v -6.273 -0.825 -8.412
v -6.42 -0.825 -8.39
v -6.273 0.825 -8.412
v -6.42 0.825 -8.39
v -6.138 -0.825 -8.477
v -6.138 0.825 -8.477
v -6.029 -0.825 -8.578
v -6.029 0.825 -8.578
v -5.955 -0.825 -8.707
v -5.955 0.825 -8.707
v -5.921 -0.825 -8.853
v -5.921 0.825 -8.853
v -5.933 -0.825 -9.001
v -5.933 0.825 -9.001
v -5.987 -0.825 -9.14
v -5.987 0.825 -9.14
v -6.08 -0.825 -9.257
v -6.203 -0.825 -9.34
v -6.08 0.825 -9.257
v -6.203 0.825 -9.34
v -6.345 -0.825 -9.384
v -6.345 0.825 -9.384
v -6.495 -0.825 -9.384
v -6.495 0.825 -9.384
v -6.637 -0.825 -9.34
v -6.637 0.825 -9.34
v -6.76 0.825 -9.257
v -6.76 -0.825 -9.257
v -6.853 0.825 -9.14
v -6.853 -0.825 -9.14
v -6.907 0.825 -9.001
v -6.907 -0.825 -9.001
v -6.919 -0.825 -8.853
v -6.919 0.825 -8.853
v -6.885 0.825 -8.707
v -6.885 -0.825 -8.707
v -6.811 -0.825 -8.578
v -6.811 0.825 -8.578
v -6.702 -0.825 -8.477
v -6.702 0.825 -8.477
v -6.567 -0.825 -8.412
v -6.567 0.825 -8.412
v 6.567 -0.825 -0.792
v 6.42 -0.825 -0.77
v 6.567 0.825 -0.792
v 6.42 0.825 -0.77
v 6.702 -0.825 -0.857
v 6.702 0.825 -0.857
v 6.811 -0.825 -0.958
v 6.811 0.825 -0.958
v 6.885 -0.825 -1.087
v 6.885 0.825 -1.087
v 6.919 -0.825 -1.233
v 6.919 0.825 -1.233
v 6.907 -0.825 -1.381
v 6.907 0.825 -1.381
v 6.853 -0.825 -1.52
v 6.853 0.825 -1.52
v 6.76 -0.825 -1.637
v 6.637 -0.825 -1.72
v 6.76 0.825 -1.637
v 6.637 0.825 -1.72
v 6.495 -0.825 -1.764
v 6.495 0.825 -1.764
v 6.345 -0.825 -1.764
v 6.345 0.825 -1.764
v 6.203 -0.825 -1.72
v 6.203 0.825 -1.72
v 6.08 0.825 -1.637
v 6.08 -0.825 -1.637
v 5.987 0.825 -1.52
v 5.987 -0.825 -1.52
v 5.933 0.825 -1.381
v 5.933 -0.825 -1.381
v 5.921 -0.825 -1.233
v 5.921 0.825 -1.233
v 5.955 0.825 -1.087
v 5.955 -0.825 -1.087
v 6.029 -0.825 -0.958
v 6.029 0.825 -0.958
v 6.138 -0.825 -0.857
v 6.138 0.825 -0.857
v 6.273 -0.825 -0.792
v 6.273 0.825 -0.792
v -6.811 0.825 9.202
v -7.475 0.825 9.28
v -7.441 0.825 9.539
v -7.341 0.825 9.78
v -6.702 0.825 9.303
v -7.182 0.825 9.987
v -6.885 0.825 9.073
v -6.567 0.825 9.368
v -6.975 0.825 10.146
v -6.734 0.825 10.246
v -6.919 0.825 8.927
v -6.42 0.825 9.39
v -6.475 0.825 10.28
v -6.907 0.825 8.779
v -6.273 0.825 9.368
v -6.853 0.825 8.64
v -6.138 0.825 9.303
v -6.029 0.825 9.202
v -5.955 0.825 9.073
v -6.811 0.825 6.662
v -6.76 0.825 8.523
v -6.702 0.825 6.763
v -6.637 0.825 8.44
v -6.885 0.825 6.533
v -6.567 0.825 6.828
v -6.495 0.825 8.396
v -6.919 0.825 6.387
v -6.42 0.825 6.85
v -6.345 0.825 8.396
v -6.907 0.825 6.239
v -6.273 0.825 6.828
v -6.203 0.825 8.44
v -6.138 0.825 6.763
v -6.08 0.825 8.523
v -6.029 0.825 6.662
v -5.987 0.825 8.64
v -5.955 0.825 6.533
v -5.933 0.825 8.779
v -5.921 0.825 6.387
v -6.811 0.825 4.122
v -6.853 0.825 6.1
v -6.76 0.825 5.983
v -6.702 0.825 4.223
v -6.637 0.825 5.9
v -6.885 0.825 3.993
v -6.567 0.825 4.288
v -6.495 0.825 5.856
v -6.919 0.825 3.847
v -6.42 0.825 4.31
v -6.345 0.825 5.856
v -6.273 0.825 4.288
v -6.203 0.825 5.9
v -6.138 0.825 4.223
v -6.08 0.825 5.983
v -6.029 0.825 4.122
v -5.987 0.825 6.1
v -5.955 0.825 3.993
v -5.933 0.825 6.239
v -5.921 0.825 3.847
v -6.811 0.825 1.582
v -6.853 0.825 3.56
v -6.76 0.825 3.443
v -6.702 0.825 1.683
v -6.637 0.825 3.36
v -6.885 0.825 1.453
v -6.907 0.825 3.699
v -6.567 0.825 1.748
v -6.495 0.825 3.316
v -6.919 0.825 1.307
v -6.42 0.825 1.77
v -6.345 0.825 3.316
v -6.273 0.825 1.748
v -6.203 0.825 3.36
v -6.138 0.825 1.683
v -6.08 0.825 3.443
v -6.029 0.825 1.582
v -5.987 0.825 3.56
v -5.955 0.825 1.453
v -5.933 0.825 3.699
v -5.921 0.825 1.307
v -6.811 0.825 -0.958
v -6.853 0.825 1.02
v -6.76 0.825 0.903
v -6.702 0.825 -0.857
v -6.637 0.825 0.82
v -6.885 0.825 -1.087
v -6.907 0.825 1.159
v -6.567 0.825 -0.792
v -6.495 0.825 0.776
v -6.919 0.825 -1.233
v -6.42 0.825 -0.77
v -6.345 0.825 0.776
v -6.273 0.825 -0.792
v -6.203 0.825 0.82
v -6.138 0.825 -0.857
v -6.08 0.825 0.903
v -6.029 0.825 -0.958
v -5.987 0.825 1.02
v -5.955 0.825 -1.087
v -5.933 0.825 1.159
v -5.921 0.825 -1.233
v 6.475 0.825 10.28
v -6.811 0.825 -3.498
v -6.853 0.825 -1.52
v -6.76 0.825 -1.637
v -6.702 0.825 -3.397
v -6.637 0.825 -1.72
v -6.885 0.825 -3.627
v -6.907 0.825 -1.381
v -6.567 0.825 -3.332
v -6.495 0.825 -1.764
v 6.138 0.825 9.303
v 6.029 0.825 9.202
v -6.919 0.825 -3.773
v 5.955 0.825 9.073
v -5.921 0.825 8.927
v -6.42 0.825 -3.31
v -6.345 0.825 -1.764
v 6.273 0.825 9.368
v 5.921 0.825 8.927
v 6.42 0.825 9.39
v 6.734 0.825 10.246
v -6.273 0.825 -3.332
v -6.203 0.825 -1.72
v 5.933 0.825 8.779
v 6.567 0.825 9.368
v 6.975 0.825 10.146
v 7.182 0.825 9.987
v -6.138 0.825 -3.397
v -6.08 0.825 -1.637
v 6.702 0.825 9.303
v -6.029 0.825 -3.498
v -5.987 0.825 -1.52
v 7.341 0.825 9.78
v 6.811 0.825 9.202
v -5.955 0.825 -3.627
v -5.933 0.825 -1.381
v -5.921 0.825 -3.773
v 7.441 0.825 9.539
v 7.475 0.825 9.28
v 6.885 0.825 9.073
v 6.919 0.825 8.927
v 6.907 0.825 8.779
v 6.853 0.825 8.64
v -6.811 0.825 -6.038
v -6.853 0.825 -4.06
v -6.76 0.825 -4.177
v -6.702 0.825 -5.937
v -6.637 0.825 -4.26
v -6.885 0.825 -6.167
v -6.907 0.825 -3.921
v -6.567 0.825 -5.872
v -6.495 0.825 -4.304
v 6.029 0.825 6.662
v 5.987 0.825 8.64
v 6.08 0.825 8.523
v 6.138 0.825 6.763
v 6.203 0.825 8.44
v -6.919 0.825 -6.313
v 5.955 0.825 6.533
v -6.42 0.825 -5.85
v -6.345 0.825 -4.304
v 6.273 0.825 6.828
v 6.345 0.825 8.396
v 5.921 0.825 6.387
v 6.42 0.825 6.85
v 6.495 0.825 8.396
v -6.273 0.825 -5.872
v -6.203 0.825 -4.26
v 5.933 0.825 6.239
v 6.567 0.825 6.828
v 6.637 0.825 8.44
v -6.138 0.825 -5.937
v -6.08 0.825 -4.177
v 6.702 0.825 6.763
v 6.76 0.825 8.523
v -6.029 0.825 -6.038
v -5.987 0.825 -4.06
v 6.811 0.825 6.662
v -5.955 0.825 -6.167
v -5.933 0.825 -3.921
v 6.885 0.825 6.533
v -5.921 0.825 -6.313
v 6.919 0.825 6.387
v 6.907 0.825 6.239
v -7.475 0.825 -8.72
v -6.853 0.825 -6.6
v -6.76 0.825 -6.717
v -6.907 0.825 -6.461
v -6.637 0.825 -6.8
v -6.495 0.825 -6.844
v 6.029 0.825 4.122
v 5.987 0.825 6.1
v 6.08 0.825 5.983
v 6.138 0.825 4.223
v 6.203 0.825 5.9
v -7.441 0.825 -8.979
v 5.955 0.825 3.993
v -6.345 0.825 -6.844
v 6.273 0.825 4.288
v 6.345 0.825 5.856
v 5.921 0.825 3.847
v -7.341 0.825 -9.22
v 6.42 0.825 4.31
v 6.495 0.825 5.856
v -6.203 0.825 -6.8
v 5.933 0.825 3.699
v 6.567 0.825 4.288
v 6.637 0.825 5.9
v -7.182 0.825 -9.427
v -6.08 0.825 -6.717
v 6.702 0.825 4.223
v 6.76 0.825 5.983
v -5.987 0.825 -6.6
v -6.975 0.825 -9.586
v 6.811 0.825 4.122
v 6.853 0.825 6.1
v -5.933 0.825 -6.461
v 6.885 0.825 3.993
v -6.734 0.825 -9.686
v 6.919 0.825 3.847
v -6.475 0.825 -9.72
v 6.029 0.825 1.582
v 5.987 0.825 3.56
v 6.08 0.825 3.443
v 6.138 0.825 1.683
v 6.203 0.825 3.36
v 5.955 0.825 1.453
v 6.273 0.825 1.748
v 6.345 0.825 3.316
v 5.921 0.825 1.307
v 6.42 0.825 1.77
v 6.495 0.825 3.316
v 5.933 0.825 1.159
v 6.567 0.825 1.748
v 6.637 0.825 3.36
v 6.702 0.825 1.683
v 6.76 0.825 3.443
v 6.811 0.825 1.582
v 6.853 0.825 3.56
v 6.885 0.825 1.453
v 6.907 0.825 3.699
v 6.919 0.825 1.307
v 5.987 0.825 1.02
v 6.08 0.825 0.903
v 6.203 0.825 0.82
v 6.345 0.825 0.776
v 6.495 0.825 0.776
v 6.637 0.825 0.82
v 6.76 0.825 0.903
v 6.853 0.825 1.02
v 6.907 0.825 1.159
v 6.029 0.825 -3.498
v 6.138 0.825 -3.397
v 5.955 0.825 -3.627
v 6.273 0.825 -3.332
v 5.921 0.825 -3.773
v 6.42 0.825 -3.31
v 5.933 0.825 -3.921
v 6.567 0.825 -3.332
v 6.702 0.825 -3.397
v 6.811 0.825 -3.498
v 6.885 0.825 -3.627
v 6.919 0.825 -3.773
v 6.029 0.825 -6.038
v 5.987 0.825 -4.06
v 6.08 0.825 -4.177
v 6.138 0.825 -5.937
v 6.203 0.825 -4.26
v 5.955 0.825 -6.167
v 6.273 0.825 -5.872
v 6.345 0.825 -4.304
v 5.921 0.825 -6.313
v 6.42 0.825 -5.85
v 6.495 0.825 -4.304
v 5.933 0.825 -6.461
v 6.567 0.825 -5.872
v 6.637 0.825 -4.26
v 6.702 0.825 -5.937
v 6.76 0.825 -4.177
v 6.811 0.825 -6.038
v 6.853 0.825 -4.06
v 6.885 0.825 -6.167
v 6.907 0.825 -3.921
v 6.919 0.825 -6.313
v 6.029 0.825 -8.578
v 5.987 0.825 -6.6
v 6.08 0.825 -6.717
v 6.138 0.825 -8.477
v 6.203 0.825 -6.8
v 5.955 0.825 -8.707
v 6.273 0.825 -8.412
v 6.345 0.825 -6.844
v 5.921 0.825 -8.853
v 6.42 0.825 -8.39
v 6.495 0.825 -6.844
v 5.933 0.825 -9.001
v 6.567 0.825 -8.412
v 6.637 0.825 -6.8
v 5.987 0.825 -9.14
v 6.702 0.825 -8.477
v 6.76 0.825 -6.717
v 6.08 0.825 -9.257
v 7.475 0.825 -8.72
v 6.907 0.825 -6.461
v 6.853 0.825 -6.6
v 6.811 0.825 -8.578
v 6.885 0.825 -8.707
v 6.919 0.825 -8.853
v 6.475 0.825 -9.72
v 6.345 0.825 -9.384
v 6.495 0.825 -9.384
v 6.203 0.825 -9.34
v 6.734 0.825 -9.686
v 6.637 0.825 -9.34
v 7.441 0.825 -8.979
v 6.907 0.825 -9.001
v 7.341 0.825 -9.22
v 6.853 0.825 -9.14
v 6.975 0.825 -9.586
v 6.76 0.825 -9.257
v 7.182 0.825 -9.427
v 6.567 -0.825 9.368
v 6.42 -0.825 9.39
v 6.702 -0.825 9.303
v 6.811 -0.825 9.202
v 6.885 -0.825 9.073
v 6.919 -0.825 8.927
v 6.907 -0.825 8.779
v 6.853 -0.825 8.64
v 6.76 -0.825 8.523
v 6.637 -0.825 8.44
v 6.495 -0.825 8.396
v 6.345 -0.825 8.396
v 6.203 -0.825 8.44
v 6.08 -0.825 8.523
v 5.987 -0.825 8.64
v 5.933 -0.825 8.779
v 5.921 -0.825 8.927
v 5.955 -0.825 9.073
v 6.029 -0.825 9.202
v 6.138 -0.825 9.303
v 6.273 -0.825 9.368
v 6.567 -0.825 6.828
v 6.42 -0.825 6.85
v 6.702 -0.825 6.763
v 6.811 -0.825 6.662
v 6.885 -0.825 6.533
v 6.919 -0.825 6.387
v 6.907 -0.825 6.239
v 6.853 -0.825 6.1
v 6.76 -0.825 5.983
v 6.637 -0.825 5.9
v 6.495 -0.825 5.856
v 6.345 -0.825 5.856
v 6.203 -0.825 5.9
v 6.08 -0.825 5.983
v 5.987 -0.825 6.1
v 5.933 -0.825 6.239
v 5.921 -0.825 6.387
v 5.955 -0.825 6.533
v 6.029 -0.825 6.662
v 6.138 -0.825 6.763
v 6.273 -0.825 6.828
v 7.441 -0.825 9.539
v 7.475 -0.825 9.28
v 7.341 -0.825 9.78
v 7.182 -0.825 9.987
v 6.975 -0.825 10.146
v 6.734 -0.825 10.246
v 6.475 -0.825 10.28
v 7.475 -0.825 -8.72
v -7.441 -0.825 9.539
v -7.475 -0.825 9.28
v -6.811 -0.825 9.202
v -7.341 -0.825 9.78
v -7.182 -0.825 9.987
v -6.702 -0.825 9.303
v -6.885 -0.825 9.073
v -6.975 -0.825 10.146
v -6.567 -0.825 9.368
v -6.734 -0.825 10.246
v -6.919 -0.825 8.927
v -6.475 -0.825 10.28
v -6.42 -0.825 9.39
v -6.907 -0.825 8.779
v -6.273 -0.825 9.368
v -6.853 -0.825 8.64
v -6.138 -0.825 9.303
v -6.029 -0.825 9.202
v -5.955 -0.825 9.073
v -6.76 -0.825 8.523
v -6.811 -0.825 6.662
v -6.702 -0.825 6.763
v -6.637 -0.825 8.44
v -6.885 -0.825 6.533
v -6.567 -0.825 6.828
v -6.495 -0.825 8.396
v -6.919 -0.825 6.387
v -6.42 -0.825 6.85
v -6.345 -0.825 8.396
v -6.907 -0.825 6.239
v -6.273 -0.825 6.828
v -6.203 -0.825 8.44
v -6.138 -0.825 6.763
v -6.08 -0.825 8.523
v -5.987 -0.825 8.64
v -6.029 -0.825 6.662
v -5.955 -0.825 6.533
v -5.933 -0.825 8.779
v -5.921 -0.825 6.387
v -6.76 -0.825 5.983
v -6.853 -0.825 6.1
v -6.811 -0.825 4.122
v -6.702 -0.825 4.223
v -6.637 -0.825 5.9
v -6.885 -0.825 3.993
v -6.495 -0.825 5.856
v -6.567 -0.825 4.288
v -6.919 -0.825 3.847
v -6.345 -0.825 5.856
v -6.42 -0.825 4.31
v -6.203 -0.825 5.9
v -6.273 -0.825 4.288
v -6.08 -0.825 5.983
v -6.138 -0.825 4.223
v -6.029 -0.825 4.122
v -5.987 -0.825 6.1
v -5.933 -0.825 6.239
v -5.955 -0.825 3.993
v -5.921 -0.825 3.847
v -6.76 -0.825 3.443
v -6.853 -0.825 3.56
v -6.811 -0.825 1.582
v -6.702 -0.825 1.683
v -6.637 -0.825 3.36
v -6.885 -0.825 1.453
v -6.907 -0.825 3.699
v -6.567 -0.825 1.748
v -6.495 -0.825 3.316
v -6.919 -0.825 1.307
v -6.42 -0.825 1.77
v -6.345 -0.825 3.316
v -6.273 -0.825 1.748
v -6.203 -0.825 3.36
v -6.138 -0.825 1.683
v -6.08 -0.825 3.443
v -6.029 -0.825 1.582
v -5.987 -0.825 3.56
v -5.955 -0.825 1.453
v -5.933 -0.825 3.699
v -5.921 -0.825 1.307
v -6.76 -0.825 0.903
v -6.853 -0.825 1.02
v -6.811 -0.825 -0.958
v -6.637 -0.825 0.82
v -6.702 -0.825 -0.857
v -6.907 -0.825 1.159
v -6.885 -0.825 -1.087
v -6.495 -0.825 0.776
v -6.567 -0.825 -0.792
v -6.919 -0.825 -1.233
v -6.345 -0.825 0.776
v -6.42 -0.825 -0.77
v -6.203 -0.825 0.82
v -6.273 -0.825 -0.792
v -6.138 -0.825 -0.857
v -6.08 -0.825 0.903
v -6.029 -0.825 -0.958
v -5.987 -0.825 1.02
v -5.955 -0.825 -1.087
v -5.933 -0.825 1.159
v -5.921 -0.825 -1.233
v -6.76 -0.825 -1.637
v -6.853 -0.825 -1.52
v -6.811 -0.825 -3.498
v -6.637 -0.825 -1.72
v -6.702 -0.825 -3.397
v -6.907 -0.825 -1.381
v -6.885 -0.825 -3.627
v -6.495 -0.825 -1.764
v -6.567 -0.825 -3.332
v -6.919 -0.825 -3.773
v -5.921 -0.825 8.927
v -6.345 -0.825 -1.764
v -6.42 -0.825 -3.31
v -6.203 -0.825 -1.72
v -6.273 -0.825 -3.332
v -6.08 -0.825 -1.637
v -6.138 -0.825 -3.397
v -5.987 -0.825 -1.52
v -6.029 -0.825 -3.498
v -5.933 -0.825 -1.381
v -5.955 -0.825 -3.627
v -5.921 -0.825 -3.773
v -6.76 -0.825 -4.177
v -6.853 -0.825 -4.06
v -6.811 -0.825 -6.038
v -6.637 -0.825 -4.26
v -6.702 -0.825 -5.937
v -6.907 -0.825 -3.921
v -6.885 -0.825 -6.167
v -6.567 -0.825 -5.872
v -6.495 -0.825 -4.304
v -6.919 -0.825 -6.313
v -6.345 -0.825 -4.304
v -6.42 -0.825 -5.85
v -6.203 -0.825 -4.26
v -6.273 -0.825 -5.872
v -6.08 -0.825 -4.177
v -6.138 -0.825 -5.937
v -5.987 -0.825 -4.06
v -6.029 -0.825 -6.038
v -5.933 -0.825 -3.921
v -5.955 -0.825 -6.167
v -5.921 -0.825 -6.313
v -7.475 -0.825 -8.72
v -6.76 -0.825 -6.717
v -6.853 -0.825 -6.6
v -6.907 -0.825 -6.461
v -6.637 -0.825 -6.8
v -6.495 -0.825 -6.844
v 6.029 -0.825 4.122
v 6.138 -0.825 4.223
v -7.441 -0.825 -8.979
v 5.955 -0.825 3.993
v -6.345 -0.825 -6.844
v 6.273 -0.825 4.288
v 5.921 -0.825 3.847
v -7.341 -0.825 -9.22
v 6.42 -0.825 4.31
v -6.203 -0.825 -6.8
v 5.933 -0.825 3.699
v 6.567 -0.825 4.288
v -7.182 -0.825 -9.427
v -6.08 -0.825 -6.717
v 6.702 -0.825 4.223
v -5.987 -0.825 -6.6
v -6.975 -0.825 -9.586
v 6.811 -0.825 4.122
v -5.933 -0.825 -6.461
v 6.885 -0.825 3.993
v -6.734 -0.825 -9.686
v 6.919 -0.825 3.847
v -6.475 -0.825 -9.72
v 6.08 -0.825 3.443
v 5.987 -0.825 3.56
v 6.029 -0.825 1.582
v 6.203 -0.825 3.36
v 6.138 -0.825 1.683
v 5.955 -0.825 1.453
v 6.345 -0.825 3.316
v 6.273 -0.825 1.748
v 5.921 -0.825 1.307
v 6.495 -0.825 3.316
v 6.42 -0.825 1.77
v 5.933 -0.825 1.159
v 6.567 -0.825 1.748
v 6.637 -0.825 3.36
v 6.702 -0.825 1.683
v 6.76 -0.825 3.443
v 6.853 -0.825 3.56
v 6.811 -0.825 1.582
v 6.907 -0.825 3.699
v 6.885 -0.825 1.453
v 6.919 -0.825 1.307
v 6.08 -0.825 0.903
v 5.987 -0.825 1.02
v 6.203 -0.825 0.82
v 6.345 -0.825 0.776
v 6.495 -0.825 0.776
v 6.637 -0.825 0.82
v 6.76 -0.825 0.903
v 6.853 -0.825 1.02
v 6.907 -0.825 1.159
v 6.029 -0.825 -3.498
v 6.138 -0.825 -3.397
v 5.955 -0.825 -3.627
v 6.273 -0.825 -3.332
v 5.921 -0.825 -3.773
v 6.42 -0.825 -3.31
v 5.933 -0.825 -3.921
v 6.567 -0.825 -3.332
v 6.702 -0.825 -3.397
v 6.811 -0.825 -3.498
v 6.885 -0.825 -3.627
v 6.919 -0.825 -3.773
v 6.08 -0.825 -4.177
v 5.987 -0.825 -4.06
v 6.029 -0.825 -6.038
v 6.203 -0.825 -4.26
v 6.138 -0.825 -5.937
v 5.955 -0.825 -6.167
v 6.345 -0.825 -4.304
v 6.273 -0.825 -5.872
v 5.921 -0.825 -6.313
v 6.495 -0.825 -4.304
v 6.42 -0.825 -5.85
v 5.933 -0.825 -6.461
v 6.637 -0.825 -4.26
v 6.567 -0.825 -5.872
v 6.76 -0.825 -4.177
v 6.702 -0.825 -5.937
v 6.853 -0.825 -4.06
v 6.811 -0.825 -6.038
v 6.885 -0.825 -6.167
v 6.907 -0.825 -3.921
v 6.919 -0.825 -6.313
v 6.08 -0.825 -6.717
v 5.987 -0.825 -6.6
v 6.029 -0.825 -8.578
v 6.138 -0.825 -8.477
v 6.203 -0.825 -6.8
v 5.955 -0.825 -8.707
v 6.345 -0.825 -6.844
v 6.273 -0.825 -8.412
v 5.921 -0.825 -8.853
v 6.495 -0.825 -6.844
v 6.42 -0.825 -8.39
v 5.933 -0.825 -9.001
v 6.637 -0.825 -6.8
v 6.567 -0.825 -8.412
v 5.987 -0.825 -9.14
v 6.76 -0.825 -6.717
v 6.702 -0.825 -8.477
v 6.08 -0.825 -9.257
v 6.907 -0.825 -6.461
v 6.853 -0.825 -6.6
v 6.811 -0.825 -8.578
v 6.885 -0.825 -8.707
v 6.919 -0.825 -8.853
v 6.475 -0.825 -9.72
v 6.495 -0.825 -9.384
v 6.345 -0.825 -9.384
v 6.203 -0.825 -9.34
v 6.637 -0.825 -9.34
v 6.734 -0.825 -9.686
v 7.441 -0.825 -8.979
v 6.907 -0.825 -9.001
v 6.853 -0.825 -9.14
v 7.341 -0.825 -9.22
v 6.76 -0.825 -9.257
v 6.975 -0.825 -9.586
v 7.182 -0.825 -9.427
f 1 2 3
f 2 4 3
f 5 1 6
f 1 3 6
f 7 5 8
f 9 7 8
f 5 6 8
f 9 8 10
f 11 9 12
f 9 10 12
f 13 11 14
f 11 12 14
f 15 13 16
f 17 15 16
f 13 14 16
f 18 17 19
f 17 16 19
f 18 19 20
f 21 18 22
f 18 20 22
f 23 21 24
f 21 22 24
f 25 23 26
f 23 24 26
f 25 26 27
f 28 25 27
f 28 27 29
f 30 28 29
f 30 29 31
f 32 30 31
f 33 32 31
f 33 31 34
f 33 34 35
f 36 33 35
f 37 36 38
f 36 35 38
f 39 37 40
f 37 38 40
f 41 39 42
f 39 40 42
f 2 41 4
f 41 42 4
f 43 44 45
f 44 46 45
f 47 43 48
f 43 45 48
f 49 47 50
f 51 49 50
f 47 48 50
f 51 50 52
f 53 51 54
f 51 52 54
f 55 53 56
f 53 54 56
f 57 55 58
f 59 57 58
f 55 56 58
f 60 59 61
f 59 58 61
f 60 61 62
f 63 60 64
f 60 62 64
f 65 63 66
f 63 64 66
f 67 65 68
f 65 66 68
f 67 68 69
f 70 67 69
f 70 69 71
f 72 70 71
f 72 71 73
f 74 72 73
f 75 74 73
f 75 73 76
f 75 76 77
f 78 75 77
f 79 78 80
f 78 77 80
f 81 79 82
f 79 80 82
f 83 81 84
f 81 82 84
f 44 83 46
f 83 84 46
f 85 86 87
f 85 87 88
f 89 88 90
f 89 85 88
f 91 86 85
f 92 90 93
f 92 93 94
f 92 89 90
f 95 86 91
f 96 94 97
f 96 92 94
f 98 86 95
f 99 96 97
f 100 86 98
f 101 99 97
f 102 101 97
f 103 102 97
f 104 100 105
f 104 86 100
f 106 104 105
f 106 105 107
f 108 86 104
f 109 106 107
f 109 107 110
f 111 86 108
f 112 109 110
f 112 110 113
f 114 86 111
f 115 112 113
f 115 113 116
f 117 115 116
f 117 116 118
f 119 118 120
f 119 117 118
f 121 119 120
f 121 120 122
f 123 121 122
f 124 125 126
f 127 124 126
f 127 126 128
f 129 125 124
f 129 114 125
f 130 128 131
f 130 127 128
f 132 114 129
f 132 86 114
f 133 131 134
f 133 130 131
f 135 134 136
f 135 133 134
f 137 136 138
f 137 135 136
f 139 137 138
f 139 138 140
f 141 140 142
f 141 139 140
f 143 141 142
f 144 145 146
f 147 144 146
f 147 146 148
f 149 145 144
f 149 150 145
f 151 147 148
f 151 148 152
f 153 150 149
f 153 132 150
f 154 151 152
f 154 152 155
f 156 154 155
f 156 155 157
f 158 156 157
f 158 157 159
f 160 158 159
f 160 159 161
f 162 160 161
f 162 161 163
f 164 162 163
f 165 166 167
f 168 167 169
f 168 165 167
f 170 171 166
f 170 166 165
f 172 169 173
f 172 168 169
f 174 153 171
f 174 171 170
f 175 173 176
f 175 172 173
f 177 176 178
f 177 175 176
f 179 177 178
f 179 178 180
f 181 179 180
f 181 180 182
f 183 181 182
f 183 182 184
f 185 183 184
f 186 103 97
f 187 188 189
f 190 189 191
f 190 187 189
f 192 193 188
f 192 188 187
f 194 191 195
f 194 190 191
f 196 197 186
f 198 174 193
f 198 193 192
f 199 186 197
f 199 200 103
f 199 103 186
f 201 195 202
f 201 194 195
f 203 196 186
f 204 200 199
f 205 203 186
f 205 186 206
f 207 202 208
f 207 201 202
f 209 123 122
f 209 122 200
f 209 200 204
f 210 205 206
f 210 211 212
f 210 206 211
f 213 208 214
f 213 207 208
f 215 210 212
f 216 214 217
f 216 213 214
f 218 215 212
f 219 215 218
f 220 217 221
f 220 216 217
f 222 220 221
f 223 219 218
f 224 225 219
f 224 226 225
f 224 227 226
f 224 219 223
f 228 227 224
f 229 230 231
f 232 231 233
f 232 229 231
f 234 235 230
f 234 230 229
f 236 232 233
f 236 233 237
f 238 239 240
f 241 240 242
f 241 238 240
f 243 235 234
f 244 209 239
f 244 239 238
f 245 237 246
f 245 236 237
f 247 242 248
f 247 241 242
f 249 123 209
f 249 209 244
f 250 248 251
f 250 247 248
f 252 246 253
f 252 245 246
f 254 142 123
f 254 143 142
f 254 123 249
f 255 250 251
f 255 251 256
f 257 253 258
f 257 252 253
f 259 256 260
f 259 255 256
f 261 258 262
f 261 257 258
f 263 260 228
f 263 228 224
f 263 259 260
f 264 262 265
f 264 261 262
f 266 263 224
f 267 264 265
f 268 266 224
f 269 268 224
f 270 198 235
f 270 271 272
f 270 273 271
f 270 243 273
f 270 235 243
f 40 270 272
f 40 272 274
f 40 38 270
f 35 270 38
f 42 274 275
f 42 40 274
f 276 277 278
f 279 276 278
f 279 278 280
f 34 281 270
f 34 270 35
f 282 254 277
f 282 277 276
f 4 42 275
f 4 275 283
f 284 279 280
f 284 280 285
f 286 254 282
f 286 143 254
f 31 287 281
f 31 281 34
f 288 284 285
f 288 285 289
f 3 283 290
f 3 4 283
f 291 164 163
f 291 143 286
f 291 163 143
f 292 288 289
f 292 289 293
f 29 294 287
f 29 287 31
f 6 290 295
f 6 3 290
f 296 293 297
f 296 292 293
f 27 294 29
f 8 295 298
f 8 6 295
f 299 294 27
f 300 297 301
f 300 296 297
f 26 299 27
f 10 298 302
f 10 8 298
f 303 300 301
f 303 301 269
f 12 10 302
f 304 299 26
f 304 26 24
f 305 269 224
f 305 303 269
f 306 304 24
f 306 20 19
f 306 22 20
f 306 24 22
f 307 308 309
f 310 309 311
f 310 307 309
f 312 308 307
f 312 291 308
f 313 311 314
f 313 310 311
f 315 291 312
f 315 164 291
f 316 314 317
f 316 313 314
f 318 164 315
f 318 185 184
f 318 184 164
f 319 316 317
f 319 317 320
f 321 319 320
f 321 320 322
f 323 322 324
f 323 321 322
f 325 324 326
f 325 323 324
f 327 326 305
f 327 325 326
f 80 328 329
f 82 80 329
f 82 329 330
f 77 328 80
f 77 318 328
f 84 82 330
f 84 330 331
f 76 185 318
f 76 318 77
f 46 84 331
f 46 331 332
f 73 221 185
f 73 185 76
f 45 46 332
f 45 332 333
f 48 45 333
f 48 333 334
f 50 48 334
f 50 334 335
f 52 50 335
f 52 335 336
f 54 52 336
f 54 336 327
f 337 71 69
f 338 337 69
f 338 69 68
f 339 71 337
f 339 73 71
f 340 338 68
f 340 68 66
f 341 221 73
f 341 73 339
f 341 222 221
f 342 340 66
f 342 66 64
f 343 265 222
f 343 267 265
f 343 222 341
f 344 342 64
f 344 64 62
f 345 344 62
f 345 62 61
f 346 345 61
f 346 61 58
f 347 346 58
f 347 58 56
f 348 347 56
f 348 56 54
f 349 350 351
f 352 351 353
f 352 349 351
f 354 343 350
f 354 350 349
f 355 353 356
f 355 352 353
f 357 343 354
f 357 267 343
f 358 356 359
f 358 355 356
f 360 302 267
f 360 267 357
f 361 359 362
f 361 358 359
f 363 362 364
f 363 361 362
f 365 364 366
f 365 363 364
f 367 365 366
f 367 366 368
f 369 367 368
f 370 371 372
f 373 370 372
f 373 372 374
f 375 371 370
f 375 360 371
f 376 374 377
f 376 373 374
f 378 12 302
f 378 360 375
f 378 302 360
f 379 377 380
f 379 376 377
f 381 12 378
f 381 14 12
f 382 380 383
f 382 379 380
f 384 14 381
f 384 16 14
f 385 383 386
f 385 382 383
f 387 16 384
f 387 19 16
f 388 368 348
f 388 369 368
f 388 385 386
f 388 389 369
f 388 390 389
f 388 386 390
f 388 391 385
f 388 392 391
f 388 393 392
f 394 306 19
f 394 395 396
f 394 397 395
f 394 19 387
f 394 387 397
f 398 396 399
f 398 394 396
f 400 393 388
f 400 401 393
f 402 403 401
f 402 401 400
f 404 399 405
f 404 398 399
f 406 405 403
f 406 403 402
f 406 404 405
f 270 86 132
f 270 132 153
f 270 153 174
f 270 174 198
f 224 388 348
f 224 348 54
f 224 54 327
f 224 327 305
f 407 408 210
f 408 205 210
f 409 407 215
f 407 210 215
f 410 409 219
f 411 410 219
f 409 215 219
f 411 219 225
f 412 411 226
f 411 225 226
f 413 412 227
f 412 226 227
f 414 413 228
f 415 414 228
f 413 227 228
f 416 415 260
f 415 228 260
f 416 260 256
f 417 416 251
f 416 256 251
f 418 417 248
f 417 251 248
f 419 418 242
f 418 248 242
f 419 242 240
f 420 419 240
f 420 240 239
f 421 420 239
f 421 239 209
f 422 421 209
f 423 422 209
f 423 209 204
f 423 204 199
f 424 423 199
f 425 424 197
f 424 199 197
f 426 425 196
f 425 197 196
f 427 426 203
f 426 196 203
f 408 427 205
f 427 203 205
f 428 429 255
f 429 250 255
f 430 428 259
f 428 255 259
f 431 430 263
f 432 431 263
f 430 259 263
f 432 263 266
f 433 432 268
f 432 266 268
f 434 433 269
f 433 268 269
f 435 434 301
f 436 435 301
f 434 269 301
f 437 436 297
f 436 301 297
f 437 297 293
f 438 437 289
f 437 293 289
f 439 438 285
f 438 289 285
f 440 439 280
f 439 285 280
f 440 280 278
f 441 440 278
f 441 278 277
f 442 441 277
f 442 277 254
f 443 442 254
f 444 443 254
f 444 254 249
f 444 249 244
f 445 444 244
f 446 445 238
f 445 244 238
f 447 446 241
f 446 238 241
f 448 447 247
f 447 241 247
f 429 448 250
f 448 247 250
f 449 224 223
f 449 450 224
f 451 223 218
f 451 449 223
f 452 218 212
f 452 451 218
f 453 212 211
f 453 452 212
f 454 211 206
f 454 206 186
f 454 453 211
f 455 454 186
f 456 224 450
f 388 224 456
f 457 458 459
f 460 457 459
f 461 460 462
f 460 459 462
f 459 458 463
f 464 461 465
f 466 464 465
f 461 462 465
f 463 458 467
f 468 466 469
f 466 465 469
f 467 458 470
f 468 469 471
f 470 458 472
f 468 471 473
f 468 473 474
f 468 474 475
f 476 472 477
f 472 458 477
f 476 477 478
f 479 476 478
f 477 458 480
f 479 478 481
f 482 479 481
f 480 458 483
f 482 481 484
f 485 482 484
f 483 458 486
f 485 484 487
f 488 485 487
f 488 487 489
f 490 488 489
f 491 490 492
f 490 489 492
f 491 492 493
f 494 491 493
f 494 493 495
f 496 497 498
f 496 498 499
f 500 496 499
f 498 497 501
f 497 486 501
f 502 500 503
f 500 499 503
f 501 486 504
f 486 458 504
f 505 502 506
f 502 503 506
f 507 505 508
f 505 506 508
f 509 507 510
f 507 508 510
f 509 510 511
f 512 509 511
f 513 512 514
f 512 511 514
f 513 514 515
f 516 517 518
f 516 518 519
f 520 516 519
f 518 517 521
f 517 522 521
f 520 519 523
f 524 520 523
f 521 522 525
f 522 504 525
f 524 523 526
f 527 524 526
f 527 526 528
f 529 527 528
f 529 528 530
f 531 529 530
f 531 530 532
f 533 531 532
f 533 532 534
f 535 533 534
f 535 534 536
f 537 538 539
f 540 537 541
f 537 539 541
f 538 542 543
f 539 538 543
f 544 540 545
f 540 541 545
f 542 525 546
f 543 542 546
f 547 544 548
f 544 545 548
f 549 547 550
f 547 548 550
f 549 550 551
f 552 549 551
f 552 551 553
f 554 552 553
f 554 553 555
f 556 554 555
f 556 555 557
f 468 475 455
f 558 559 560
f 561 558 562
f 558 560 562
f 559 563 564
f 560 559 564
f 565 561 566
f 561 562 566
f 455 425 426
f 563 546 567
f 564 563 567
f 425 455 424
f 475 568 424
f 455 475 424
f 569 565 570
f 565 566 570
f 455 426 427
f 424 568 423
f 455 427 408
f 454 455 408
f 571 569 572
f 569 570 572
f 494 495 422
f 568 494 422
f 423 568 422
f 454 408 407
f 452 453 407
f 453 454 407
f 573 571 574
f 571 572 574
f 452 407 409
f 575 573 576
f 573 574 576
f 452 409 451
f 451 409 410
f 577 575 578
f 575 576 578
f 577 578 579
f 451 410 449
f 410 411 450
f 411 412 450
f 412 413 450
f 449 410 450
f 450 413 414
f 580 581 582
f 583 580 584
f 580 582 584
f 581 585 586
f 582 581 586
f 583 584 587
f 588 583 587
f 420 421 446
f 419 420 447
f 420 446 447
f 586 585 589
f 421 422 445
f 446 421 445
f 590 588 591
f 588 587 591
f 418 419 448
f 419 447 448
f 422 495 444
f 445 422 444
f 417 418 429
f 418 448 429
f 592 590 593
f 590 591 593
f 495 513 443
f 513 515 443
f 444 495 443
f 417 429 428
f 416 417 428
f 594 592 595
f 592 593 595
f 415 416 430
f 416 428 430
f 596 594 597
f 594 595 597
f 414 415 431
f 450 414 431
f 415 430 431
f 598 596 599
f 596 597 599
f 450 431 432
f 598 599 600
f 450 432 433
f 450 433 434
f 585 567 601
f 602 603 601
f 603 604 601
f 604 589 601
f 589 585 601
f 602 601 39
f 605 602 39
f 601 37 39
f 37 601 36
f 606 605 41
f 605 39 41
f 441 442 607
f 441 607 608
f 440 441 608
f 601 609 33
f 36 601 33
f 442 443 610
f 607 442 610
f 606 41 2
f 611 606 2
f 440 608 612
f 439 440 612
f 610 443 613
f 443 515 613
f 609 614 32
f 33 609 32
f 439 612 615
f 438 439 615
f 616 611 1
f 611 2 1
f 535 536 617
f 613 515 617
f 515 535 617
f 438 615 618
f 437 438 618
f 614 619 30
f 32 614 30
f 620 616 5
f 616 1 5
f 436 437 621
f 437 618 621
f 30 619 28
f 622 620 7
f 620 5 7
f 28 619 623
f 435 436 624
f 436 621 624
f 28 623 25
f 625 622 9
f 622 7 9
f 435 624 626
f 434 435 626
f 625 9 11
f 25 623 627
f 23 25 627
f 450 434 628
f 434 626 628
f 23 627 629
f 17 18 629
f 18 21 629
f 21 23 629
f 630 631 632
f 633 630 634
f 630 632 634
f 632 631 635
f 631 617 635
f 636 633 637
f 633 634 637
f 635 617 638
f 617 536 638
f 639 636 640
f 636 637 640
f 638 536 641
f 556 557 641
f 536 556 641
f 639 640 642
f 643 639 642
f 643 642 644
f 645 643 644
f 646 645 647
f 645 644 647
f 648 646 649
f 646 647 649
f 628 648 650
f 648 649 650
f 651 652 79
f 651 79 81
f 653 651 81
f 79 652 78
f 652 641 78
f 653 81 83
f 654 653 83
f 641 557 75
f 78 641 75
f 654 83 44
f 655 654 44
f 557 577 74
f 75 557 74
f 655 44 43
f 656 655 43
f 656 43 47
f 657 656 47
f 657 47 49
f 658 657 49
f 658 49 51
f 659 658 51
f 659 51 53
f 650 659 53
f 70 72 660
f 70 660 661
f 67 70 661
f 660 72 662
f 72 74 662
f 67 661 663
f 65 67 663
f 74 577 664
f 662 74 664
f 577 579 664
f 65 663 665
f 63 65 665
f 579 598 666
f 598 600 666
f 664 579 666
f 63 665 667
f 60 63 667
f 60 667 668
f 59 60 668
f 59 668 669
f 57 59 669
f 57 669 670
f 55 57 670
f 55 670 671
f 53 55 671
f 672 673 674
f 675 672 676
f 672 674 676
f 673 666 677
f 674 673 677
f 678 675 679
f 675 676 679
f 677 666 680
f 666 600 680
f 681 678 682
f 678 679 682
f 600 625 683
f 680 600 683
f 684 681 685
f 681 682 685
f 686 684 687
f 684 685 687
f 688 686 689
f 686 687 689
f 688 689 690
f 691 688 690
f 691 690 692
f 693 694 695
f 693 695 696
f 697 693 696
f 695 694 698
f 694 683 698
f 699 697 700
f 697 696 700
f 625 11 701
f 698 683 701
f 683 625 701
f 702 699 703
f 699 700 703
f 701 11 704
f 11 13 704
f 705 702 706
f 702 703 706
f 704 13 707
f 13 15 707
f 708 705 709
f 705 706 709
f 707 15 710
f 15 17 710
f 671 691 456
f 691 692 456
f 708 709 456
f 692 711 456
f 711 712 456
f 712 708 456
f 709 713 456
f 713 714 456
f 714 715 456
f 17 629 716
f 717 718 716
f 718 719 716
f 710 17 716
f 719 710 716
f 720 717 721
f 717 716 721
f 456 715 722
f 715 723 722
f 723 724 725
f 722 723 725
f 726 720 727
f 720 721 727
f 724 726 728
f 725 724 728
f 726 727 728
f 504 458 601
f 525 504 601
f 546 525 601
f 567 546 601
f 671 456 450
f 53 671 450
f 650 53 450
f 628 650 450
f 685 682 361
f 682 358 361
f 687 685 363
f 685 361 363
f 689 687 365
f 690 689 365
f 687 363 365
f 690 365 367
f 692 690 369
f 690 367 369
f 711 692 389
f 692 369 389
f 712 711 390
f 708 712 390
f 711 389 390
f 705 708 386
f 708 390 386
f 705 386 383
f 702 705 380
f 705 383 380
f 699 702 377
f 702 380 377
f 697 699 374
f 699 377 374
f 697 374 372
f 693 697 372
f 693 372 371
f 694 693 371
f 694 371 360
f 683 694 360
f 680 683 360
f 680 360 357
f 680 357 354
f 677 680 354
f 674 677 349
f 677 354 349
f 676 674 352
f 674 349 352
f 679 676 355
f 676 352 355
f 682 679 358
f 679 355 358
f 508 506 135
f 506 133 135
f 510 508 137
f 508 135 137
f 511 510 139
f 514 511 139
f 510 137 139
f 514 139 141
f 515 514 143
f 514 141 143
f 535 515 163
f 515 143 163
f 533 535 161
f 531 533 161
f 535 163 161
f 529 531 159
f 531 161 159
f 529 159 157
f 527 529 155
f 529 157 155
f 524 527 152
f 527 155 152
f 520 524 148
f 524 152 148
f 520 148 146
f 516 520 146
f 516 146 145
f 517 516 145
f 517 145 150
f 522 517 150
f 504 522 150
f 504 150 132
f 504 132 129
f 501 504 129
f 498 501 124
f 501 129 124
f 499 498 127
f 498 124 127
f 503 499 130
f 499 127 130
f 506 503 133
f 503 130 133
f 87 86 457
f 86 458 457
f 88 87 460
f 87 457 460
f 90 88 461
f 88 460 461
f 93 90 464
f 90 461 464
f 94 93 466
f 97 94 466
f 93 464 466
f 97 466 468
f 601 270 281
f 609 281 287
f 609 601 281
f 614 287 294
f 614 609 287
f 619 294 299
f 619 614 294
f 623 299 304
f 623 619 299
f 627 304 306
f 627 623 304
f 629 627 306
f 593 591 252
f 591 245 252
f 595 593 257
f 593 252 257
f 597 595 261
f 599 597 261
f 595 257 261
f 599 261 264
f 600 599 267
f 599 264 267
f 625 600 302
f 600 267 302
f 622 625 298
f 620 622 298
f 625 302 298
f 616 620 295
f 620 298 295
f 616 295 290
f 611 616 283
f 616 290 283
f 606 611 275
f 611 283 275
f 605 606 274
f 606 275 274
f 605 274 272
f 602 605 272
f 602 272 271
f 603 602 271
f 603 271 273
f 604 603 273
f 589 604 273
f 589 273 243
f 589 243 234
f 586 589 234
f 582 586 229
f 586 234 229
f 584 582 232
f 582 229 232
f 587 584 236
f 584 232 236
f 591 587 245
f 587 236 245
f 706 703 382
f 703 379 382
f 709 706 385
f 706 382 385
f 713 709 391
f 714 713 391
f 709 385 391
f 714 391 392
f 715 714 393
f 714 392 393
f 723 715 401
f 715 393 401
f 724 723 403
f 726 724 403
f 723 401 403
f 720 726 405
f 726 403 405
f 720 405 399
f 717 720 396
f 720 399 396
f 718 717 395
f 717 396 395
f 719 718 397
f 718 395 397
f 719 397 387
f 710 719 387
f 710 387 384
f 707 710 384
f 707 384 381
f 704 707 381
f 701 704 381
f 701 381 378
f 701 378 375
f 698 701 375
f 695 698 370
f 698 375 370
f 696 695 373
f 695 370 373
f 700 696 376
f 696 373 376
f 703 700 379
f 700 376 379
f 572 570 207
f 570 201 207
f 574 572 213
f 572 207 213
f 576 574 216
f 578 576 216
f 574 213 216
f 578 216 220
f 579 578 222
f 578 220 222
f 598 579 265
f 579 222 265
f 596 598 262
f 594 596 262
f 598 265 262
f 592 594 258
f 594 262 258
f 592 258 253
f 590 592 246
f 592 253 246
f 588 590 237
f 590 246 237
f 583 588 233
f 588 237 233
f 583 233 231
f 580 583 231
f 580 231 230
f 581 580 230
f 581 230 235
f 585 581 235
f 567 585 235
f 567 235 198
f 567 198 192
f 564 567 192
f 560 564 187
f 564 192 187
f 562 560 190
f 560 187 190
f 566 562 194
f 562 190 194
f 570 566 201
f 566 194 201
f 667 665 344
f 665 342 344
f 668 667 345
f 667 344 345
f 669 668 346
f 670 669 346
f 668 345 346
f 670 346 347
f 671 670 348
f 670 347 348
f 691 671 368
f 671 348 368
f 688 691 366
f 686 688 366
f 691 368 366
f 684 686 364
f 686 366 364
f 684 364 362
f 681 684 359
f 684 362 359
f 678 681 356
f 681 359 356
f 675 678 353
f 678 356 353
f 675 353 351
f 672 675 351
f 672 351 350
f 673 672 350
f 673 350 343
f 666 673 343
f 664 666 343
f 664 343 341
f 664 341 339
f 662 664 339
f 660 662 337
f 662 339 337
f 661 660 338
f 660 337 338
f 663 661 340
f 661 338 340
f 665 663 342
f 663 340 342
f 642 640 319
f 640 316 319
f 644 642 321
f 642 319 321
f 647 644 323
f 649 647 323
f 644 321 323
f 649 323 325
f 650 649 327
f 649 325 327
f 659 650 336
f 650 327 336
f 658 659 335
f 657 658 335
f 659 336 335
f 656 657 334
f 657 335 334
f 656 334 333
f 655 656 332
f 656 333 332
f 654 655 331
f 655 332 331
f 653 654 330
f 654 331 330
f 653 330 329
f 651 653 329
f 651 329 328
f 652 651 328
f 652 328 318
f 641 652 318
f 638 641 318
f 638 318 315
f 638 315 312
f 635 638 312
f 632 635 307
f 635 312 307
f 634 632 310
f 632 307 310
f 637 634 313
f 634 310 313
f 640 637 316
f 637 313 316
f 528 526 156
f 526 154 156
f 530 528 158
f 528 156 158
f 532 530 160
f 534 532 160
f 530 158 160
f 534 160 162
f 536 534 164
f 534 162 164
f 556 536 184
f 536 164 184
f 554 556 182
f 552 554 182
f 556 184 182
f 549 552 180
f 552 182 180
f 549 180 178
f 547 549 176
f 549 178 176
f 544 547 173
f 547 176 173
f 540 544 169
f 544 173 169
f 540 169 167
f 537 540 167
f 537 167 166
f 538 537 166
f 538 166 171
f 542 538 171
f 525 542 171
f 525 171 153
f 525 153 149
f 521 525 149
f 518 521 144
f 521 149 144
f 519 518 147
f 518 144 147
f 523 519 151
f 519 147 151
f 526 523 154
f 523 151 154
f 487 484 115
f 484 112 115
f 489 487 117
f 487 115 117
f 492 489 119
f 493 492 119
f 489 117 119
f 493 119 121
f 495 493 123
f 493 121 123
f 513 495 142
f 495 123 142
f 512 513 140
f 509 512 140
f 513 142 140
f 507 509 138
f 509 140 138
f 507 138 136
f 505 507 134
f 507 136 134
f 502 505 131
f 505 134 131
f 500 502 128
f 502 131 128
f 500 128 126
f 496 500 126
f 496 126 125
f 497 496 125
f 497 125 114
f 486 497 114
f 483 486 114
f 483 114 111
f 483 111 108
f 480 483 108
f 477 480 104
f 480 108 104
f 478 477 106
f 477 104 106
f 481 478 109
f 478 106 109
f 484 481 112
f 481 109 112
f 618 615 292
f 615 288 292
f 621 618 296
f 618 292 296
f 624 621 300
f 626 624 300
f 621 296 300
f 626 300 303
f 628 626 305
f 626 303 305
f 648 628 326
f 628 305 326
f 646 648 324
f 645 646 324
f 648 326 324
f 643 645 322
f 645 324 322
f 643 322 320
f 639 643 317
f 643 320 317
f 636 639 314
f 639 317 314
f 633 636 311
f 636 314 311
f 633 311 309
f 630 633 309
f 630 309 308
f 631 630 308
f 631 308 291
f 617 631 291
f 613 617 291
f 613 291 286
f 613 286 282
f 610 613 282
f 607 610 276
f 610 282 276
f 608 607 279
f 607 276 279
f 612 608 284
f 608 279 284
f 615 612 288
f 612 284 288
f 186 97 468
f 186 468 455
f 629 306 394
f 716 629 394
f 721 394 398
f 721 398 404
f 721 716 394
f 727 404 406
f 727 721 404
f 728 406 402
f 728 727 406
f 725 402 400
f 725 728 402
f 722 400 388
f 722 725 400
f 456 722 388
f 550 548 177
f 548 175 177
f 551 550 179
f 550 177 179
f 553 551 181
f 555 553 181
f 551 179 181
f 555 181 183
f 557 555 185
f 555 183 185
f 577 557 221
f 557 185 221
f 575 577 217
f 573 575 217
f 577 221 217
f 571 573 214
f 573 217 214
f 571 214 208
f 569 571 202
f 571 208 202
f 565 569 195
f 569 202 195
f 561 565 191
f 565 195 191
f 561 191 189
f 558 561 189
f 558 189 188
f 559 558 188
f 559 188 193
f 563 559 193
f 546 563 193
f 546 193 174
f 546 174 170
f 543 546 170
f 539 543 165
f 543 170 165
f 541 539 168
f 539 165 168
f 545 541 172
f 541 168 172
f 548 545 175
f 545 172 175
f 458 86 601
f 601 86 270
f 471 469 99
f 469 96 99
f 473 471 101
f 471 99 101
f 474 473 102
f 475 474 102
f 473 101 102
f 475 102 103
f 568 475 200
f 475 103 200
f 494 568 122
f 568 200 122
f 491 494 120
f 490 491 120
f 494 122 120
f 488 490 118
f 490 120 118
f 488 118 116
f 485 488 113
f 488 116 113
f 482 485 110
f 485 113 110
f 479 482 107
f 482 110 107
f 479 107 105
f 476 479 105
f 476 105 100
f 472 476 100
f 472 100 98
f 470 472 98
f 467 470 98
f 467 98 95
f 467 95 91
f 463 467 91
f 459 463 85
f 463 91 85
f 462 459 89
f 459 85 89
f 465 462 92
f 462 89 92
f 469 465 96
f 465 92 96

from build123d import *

# Parameters (mm, degrees)
SKETCH1_W            = 17.92
SKETCH1_H            = 22.86
BOSS_EXTRUDE1_DEPTH  = 0.825
SKETCH3_R            = 0.5
CUT_EXTRUDE1_DEPTH   = 15.546722139
LPATTERN1_COUNT      = 8
LPATTERN1_PITCH      = 2.54
LPATTERN1_COUNT_DIR2 = 2
LPATTERN1_PITCH_DIR2 = 12.84
SKETCH4_W            = 18.95
SKETCH4_H            = 24
SKETCH4_W_2          = 14.95
SKETCH4_H_2          = 20
CUT_EXTRUDE2_DEPTH   = 15.616736982
FILLET1_R            = 1


with BuildPart() as part:
    # Sketch1 → Boss-Extrude1 (new, symmetric)
    with BuildSketch(Plane(origin=(0, 0, 0), x_dir=(1, 0, 0), z_dir=(0, 1, 0))):
        Rectangle(SKETCH1_W, SKETCH1_H)
    extrude(amount=BOSS_EXTRUDE1_DEPTH, both=True)

    # Sketch3 → Cut-Extrude1 (cut, symmetric)
    with BuildSketch(Plane(origin=(0, 0, 0), x_dir=(1, 0, 0), z_dir=(0, 1, 0))):
        with Locations(Location((-6.42, -8.89, 0), (0, 0, 270))):
            Circle(SKETCH3_R)
    cut_extrude1 = extrude(amount=CUT_EXTRUDE1_DEPTH, both=True, mode=Mode.SUBTRACT)

    # LPattern1: Cut-Extrude1 8 × 2
    with Locations(*[(j * LPATTERN1_PITCH_DIR2, 0, -i * LPATTERN1_PITCH) for i in range(LPATTERN1_COUNT) for j in range(LPATTERN1_COUNT_DIR2) if (i, j) != (0, 0)]):
        add(cut_extrude1, mode=Mode.SUBTRACT)

    # Sketch4 → Cut-Extrude2 (cut, through all)
    with BuildSketch(Plane(origin=(0, 0.825, 0), x_dir=(1, 0, 0), z_dir=(0, 1, 0))):
        with Locations((0, -0.28)):
            Rectangle(SKETCH4_W, SKETCH4_H)
        with Locations((0, -0.28)):
            Rectangle(SKETCH4_W_2, SKETCH4_H_2, mode=Mode.SUBTRACT)
    extrude(amount=-CUT_EXTRUDE2_DEPTH, mode=Mode.SUBTRACT)

    # Fillet1
    fillet1_edges = [part.edges().sort_by_distance(p)[0] for p in [
        (-7.475, 0, -9.72),
        (7.475, 0, -9.72),
        (7.475, 0, 10.28),
        (-7.475, 0, 10.28),
    ]]
    fillet(fillet1_edges, radius=FILLET1_R)


solid = part.part
